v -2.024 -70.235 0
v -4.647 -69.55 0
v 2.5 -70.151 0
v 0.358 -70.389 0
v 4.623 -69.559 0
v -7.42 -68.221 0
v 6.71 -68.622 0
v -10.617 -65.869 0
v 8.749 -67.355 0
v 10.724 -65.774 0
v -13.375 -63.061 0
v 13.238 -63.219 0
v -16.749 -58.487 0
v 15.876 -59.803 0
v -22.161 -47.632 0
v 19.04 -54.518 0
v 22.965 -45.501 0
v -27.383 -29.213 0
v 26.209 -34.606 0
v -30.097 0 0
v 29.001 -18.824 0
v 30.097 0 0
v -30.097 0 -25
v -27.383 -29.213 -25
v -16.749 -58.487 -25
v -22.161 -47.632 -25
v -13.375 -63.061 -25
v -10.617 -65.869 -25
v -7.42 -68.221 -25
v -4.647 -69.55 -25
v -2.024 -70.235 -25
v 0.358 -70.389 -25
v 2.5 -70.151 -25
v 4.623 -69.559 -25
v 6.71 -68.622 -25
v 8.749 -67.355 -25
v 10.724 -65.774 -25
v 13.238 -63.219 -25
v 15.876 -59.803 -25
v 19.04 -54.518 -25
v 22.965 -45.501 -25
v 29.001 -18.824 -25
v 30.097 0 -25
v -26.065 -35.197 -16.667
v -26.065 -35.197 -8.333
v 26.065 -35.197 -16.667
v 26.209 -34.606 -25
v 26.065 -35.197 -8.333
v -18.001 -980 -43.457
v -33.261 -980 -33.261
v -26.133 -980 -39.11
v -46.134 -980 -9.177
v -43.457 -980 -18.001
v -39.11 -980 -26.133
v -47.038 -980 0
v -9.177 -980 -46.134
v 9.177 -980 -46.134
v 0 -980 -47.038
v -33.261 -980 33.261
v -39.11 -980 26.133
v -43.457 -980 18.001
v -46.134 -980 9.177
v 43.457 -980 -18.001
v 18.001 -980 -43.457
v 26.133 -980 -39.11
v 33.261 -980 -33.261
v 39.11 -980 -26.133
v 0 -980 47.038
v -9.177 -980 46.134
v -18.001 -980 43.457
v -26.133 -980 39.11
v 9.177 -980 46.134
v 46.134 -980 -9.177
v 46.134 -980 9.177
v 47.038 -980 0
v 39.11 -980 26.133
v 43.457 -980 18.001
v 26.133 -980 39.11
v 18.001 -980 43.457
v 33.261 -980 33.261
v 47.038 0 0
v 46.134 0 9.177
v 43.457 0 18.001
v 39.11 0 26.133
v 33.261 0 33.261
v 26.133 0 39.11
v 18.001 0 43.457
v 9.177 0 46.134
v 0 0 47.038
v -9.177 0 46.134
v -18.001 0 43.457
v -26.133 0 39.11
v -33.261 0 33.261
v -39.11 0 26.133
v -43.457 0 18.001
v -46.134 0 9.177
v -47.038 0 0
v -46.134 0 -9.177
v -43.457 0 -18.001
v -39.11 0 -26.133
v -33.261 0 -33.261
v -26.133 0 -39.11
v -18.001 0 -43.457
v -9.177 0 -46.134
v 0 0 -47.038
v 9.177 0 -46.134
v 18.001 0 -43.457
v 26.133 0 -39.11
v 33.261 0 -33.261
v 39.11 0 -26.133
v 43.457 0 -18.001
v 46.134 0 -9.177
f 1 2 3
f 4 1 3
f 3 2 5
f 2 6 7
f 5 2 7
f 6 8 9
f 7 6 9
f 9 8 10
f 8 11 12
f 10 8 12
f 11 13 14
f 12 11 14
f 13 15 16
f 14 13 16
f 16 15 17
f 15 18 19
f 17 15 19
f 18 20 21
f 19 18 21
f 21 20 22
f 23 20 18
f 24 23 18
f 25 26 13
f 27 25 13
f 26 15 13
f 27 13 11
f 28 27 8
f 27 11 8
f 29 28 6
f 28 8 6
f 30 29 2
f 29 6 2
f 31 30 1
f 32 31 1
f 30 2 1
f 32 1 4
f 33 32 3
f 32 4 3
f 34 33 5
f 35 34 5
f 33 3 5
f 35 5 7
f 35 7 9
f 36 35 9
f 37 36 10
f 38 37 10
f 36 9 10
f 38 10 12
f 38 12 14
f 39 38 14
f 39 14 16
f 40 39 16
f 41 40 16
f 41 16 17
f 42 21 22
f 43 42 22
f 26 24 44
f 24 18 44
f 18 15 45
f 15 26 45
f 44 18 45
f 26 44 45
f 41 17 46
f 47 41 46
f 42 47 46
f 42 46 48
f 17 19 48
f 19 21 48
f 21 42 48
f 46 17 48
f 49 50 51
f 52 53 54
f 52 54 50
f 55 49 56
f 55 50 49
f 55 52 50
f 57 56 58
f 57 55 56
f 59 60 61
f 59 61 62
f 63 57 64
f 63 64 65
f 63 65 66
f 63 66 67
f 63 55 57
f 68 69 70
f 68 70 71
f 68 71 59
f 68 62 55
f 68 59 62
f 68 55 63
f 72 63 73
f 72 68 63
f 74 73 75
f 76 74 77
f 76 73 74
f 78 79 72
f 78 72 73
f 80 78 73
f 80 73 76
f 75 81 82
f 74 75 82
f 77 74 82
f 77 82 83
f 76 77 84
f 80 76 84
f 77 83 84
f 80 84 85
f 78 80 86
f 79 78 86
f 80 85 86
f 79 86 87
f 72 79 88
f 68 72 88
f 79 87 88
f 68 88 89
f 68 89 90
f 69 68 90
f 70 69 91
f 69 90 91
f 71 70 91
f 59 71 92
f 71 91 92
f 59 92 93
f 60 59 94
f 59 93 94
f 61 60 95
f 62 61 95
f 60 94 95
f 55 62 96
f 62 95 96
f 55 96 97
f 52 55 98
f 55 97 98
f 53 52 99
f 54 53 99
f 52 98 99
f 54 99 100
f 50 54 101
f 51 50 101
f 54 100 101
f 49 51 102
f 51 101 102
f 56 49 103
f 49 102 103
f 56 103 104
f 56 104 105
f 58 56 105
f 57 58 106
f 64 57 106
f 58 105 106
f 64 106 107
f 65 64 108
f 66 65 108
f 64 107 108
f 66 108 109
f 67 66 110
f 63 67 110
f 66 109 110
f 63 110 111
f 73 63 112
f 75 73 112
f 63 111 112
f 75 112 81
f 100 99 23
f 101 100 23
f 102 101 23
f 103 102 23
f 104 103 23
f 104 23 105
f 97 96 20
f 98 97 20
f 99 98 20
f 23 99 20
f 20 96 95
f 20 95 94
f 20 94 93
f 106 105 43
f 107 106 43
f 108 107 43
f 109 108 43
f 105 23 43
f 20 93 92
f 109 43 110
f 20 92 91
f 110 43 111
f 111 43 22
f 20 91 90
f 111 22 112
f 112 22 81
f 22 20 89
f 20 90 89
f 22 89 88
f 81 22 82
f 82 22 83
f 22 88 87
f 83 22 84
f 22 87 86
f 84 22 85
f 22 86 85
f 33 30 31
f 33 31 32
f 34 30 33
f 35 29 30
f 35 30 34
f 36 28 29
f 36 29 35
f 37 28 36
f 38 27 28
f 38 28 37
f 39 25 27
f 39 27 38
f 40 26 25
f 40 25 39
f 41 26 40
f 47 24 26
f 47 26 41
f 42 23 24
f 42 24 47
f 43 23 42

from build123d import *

# Parameters (mm, degrees)
F0_R     = 47.037606
F1_DEPTH = 980
F2_R     = 25.753318
F3_DEPTH = 25
F5_DEPTH = 25


with BuildPart() as f1:
    # F0 (on Front) → F1 (new body)
    with BuildSketch(Plane.XZ):
        Circle(F0_R)
    extrude(amount=F1_DEPTH)

    # F2 (on Front) → F3 (join)
    with BuildSketch(Plane.XZ):
        Circle(F2_R)
    extrude(amount=F3_DEPTH)

    # F4 (on Top) → F5 (cut)
    with BuildSketch(Plane.XY):
        with BuildLine():
            add(Edge.make_bspline(
                [(0, 70.394285), (-52.129742, 70.394285), (-26.064871, -35.197143), (0, -140.78857), (26.064871, -35.197143), (52.129742, 70.394285), (0, 70.394285)],
                knots=[0, 0, 0, 2.094395, 2.094395, 4.18879, 4.18879, 6.283185, 6.283185, 6.283185], degree=2, weights=[1, 0.5, 1, 0.5, 1, 0.5, 1]))
        make_face()
    extrude(amount=-F5_DEPTH, mode=Mode.SUBTRACT)


solid = f1.part
